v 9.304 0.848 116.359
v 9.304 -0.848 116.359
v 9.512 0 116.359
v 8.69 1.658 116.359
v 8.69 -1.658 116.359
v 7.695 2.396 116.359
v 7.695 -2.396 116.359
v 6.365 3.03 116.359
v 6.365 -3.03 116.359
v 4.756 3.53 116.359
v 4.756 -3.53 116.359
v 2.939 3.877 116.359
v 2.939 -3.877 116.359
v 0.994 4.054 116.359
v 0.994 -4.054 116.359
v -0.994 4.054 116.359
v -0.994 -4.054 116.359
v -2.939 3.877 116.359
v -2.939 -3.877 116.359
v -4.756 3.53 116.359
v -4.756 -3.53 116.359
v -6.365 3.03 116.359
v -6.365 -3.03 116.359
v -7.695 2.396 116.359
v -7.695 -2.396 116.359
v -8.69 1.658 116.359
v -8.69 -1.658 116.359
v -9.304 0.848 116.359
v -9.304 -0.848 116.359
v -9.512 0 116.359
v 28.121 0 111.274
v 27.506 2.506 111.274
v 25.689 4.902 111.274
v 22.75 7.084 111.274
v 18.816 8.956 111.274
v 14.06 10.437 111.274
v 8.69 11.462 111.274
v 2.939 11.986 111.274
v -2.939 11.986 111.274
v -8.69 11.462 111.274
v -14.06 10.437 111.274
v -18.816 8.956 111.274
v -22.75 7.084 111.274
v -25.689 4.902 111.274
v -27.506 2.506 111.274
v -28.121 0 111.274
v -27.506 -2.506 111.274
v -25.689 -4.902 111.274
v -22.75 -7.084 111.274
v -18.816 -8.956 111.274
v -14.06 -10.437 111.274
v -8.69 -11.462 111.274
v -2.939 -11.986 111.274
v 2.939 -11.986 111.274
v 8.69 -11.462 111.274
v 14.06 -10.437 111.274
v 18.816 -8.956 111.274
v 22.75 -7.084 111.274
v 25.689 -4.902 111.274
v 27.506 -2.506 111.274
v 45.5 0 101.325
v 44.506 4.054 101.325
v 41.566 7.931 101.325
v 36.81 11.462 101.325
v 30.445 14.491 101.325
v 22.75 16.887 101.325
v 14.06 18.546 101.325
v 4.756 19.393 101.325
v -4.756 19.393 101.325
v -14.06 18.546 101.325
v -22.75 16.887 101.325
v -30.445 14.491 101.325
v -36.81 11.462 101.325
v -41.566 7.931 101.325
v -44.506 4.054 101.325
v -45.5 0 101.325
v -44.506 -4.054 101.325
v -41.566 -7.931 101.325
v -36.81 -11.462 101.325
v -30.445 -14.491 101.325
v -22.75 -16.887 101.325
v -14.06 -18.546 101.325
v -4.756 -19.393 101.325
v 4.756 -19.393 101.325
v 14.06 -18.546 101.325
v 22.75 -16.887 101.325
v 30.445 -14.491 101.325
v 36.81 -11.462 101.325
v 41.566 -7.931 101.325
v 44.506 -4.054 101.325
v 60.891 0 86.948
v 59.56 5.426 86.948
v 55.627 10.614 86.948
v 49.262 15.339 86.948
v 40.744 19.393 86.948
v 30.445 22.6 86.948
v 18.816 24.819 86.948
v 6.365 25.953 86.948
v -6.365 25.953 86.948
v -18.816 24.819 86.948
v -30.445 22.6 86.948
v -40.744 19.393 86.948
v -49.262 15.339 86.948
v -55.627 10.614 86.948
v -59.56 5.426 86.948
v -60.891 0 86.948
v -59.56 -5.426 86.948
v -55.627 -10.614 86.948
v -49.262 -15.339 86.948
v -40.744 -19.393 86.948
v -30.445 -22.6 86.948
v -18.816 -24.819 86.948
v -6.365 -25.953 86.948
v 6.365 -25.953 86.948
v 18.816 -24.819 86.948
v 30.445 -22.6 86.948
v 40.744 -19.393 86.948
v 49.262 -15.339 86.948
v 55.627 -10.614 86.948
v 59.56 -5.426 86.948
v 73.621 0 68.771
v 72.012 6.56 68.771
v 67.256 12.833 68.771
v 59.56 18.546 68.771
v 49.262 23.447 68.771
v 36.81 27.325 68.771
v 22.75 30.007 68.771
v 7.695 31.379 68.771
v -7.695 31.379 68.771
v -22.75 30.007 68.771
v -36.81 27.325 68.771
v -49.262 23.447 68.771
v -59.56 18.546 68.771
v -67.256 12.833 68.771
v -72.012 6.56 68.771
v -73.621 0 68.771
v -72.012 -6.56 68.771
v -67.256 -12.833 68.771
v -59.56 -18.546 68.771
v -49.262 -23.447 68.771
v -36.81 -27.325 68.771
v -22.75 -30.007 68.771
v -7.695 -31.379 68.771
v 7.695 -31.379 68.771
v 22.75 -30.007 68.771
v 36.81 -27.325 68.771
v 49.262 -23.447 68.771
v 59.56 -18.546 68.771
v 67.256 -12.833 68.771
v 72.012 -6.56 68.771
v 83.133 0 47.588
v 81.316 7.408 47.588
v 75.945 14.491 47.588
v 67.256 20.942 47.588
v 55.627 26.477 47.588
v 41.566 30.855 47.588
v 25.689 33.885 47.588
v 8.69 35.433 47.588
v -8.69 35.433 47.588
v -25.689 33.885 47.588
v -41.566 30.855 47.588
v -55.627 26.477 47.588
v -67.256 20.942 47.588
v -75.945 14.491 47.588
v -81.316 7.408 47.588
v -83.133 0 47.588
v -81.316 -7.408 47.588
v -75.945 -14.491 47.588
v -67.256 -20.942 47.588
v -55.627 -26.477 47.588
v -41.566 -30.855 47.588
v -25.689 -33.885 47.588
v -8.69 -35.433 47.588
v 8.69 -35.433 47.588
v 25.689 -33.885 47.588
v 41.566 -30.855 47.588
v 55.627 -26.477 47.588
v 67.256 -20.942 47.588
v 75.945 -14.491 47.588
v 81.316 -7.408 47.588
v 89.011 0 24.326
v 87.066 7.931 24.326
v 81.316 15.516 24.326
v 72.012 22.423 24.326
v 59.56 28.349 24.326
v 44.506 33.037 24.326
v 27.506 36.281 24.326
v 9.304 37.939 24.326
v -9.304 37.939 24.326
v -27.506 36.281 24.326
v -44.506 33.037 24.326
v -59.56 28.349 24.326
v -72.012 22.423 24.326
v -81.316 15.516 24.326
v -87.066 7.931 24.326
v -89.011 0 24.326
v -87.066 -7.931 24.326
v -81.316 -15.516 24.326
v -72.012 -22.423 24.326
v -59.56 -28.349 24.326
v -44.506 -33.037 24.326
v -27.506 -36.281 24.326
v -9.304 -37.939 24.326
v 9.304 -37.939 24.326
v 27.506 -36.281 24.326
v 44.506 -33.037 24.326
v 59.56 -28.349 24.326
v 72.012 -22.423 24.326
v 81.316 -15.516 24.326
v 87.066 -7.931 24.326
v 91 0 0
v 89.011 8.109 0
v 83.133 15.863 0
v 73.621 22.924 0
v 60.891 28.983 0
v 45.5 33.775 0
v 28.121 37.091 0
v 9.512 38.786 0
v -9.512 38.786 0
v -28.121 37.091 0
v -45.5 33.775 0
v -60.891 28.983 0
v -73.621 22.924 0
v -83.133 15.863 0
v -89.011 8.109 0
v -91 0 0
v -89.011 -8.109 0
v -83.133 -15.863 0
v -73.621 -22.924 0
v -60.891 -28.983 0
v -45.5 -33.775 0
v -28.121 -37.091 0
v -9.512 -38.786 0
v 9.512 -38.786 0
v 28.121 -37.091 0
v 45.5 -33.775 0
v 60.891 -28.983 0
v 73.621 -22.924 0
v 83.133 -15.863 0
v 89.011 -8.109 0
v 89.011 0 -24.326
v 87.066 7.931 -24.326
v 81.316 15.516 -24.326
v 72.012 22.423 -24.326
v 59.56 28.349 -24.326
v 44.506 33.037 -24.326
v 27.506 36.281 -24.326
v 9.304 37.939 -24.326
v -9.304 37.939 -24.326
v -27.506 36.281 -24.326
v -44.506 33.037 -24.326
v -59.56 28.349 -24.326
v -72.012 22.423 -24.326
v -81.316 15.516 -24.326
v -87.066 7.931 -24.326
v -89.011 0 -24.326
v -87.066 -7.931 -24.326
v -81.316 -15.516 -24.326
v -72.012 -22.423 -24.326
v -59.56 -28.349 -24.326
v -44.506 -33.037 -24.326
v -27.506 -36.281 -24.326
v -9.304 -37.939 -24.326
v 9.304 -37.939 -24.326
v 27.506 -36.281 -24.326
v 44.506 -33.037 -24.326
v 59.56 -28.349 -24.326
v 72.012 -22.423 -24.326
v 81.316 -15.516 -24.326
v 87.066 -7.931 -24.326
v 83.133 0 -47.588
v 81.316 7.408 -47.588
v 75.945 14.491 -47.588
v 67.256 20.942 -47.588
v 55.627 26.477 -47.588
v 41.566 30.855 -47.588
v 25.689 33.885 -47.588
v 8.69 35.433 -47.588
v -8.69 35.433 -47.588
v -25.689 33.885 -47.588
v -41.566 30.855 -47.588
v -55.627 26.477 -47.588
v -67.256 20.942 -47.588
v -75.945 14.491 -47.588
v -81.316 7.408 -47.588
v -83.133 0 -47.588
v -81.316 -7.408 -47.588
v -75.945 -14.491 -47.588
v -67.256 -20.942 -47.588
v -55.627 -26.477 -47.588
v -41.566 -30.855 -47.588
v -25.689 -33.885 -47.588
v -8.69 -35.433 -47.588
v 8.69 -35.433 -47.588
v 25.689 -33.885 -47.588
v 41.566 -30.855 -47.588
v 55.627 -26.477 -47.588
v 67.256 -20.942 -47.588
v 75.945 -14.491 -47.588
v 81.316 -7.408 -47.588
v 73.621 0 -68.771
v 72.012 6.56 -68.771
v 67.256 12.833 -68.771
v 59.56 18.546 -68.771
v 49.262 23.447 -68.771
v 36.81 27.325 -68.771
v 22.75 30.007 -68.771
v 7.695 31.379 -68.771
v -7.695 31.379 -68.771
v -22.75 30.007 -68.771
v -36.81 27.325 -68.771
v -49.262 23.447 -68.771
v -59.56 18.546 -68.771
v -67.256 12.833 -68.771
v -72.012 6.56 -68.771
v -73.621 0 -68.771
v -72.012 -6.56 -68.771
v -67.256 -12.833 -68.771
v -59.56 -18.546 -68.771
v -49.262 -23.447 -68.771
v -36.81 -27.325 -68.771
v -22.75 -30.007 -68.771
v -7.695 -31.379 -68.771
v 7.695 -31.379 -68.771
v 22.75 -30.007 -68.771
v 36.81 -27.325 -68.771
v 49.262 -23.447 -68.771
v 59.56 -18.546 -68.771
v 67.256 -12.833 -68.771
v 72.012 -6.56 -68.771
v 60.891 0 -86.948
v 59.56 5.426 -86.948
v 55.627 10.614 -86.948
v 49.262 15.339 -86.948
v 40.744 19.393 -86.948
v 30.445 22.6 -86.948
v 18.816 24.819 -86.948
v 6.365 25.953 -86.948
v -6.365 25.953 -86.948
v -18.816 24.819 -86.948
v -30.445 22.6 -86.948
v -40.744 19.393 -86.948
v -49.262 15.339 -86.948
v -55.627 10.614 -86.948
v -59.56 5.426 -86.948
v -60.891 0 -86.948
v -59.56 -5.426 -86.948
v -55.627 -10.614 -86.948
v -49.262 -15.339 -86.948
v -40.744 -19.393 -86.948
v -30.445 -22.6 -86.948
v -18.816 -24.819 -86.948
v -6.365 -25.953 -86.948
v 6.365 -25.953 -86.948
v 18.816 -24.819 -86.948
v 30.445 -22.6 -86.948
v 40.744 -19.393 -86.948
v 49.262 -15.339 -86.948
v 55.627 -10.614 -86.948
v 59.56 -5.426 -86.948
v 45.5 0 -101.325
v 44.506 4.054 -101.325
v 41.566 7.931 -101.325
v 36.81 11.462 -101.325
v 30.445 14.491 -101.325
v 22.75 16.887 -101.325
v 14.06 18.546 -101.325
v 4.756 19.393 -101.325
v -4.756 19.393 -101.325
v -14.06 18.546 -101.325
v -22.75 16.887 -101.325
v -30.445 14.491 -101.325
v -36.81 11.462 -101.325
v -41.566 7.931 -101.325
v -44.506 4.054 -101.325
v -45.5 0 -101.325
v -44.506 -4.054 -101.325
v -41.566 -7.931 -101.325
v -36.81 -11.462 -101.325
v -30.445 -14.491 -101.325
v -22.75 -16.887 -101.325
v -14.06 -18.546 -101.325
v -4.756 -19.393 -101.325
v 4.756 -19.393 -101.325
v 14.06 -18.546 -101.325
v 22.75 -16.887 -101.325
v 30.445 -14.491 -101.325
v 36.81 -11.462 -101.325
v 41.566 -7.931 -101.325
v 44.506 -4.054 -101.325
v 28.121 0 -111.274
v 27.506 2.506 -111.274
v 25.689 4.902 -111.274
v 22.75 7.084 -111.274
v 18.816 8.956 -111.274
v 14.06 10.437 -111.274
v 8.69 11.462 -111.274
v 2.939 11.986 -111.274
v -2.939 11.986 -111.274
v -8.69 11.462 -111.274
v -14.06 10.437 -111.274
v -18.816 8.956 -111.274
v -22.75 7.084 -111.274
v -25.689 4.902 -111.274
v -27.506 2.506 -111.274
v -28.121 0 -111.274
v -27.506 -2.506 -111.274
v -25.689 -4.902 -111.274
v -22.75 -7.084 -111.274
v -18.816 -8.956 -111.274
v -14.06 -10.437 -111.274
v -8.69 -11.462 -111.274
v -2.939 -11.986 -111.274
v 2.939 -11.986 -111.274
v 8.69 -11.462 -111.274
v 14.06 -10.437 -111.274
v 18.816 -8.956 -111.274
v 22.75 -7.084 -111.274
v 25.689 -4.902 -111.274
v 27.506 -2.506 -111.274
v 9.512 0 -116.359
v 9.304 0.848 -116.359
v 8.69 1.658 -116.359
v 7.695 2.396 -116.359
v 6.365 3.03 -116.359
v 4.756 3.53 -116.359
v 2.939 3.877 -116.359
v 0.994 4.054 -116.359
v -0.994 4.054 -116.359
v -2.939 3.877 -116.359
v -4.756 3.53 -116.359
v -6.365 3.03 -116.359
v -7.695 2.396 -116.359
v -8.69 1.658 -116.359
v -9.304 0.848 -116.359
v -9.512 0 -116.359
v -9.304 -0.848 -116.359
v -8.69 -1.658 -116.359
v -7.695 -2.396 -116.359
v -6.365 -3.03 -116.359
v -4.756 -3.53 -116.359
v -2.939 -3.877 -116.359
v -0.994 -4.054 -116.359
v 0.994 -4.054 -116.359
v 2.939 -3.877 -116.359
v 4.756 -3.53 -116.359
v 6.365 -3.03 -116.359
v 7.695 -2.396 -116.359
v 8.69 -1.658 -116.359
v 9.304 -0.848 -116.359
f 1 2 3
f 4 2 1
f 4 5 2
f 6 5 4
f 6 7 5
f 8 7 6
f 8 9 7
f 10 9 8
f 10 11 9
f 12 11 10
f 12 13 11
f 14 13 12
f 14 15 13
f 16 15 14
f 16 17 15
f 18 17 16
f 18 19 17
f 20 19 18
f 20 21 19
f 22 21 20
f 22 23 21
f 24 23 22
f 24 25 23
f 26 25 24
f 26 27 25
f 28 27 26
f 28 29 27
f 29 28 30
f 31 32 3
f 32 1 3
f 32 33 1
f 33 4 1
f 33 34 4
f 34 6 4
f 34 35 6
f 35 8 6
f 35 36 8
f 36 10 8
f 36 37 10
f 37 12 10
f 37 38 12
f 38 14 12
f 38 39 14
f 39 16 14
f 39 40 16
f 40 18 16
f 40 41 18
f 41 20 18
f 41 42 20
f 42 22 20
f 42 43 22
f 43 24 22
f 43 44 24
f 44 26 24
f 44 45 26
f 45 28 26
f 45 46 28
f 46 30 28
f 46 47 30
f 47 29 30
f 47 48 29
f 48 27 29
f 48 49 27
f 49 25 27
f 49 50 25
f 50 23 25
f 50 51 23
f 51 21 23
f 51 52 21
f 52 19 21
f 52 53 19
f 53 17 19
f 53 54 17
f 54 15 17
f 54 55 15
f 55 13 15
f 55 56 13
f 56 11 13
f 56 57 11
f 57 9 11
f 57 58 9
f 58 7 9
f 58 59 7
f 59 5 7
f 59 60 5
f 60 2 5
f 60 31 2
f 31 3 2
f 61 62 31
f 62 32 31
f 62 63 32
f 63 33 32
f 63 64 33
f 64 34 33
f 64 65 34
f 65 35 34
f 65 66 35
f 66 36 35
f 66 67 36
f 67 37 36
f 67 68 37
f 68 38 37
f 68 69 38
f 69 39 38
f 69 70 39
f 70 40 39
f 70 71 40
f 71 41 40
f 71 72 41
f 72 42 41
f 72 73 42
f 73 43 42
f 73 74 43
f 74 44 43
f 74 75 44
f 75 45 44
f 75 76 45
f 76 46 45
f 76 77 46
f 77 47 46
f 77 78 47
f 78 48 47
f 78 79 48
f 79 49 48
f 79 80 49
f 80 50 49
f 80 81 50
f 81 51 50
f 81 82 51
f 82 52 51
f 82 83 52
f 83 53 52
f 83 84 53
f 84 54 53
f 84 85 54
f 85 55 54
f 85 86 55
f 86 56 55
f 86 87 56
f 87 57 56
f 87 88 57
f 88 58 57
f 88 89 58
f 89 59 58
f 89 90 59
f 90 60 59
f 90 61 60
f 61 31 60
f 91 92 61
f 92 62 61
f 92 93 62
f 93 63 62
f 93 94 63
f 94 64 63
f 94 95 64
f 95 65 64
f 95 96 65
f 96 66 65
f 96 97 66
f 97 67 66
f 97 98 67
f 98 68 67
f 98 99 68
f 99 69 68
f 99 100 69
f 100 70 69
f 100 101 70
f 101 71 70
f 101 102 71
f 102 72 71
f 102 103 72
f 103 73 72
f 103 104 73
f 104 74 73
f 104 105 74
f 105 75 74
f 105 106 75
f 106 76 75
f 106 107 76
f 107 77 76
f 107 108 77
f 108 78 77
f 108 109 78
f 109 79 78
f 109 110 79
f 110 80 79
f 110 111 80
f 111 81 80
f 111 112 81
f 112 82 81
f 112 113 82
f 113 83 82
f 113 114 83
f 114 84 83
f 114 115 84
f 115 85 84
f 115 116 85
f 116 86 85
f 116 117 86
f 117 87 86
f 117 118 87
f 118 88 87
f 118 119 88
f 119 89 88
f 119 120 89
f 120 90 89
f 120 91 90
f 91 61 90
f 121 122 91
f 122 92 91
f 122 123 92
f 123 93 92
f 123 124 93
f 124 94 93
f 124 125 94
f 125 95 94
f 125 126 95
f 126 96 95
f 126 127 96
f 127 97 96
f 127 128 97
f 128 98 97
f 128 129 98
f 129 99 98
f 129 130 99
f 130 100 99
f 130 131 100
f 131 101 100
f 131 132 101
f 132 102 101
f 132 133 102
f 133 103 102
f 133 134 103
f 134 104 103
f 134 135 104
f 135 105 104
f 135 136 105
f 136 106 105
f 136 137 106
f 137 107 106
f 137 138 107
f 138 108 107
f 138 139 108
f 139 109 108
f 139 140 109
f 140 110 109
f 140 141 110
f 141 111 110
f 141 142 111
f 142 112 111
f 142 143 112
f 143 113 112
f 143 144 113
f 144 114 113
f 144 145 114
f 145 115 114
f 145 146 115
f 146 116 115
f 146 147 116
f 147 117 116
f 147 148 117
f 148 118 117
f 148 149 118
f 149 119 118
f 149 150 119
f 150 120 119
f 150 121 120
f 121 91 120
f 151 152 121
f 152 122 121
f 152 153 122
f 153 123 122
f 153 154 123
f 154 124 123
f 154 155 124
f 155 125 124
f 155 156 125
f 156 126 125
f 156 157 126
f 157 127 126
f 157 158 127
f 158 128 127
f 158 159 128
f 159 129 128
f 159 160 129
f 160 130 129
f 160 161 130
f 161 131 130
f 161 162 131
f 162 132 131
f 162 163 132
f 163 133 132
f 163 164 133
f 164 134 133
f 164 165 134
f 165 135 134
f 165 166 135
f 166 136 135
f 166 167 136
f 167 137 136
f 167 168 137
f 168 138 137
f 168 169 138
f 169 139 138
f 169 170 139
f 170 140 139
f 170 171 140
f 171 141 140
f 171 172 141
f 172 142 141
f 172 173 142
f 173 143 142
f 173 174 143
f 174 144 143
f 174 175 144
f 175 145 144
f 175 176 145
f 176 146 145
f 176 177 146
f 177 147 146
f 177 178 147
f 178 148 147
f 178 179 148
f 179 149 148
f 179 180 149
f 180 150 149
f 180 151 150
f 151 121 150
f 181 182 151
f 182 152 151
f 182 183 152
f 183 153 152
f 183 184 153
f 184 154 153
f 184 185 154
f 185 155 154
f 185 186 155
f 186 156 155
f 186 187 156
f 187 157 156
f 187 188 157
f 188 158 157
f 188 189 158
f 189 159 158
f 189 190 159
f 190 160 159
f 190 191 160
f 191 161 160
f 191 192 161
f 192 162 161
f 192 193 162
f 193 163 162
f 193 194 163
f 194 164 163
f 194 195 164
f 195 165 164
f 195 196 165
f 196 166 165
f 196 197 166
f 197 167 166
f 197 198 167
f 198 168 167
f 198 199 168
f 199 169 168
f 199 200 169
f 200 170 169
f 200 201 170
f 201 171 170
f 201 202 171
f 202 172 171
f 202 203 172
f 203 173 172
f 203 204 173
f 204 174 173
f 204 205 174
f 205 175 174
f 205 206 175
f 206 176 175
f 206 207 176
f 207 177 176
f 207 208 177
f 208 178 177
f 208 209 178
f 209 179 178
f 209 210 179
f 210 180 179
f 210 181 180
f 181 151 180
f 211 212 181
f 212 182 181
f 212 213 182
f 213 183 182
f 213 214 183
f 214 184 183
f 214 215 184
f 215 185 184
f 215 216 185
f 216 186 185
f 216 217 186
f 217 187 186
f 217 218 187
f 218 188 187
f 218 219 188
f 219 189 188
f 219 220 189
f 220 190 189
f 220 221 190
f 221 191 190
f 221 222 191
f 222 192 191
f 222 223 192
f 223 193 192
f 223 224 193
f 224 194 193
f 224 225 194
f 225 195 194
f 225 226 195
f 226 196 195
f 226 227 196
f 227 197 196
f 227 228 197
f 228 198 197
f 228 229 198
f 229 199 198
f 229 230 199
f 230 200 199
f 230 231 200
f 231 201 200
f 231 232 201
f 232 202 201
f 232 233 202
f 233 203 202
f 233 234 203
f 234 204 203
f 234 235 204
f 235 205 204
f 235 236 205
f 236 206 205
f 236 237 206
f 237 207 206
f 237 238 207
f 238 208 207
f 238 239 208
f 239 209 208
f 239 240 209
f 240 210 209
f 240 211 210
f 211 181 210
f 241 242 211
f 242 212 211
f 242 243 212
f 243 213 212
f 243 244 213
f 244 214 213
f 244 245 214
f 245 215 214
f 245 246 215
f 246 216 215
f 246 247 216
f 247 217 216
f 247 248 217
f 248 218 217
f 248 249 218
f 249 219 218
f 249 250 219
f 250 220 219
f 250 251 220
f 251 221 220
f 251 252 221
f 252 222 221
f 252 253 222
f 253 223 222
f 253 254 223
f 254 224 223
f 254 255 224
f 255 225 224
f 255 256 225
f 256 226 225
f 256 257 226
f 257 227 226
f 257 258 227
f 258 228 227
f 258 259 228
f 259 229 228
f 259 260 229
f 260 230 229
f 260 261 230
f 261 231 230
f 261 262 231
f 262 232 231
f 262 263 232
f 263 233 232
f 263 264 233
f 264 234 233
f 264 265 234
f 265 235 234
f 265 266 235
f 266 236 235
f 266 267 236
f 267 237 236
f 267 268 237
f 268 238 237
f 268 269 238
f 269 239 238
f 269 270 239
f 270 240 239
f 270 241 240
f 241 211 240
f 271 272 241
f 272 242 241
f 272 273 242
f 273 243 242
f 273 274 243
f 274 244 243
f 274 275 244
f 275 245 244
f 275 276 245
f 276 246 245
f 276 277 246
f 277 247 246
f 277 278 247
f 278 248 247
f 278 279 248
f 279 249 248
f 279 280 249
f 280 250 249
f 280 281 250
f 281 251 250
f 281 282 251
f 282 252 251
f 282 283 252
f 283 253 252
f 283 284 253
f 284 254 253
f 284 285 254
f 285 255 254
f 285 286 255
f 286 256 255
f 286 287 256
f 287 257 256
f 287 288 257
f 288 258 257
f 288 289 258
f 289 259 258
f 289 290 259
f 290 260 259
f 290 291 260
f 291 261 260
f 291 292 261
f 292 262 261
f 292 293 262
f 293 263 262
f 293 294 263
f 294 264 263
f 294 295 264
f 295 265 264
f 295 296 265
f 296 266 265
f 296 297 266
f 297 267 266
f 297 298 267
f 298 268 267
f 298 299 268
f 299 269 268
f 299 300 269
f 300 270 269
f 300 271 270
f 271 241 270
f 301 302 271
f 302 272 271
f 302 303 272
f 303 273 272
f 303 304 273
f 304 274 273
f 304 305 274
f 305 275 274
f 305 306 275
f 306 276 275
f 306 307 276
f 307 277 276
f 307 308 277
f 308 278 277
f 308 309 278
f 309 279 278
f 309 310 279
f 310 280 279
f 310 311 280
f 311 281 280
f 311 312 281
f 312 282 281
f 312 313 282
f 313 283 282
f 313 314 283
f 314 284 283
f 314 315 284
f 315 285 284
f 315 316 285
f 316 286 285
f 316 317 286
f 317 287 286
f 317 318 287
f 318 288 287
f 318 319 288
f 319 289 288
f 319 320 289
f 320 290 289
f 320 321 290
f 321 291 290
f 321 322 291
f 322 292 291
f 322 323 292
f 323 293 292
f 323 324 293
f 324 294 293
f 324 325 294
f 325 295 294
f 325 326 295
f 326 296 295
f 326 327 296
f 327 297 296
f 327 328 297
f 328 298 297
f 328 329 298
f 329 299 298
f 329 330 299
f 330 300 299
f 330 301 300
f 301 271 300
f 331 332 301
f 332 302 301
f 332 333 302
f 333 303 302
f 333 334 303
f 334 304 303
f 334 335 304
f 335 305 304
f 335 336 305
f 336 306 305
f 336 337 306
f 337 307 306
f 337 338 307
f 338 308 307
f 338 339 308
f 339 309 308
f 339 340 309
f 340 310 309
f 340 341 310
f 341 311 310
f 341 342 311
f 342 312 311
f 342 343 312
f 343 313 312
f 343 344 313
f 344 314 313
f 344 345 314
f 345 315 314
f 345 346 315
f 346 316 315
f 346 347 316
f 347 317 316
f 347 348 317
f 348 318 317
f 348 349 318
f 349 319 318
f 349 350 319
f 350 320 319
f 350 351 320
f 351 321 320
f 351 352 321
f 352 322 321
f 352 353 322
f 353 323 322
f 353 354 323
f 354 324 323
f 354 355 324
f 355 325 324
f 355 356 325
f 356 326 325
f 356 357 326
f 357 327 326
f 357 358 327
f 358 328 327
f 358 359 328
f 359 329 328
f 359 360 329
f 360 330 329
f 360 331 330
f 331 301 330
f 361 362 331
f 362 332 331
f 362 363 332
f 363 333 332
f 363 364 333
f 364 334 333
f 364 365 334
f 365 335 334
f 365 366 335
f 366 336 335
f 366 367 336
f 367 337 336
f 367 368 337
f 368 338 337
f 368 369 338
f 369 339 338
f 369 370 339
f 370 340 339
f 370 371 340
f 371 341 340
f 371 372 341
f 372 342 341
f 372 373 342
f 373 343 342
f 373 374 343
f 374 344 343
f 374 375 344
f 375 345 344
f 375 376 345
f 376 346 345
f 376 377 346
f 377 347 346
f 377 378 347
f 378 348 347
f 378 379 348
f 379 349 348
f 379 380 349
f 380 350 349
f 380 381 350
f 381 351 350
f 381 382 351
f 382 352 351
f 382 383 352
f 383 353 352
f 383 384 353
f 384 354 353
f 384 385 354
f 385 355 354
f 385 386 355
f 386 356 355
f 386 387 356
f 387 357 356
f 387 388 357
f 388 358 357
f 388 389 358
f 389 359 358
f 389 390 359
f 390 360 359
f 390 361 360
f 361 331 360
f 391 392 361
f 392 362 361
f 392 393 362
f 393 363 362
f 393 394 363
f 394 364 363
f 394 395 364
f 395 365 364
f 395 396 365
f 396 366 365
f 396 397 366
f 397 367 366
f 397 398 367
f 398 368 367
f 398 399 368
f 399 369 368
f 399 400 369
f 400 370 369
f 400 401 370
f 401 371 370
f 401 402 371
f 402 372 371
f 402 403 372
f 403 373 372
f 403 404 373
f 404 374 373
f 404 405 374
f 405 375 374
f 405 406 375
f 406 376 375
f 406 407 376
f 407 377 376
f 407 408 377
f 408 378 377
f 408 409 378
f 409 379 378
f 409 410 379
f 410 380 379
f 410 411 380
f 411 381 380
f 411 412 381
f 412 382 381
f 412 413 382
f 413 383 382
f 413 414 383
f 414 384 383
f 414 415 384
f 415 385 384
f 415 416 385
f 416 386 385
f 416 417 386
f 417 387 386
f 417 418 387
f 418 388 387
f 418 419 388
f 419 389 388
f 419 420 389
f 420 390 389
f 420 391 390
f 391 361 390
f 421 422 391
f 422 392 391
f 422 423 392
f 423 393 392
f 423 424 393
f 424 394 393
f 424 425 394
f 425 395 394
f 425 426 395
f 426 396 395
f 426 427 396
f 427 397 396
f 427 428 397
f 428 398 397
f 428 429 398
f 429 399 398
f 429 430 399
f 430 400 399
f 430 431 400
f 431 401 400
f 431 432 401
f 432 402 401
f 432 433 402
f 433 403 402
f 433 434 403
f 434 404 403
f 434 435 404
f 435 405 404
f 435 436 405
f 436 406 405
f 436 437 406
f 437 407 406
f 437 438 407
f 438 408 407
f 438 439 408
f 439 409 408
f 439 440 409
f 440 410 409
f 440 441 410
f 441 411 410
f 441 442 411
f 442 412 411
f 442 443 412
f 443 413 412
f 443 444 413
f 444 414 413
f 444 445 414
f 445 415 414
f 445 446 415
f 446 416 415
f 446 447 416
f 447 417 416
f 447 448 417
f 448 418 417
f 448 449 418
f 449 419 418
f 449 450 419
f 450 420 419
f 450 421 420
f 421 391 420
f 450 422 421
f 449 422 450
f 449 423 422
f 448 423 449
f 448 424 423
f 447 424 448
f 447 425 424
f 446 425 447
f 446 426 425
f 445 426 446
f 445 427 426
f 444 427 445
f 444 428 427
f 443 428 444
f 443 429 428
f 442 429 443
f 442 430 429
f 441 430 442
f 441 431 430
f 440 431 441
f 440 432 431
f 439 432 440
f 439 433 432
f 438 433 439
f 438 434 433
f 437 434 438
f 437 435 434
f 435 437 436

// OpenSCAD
// Generated by SolidPython 1.0.1 on 2020-07-29 00:46:47


scale(v = [7, 3, 9]) {
	sphere(r = 13);
}
/***********************************************
*********      SolidPython code:      **********
************************************************
 
# import packages: SolidPython
from solid import *
from solid.utils import *
from itertools import chain, combinations, permutations


class Resize:

    def __init__(self, scad_file):
        self.scad_file = scad_file
        #self.scad_file = import_scad(scad_file)
        # cone/cylinder param:
        self.r1 = 0
        self.r2 = 0
        self.h = 0
        # rectangular prism param:
        self.w = 0
        self.l = 0
        # ellipse param:
        self.r = 0

    # import OpenScad code (file name corresponds to shape)


    # classify shape + parameters
    def assign(self, param1, param2, param3):
        if self.scad_file == 'cone.scad':
            self.r1 = param1
            self.r2 = param2
            self.h = param3
        elif self.scad_file == 'cylinder.scad':
            self.r1 = param1
            self.r2 = param2
            self.h = param3
        elif self.scad_file == 'rectangularPrism.scad':
            self.h = param1
            self.l = param2
            self.w = param3
        else:
            self.r = param1
            self.h = param2

    # resize parameters
    def iterate(self):
        x = range(3, 20, 2)
        i = 1
        if self.scad_file == 'cone.scad':
            tempList = list(permutations(x, 2))
            for temp in tempList:
                param1 = temp[0]
                param2 = temp[1]
                filepath = 'produced_scad_files/' + 'cone' + str(param1) + '_' + str(param2) + '_' + '.scad'
                scad_render_to_file(cylinder(h=param1, r1=param2, r2=0), filepath)

        elif self.scad_file == 'cylinder.scad':
            tempList = list(permutations(x, 3))
            for temp in tempList:
                param1 = temp[0]
                param2 = temp[1]
                filepath = 'produced_scad_files/' + 'cylinder' + str(param1) + '_' + str(param2) + '_' + '.scad'
                scad_render_to_file(cylinder(h=param1, r1=param2, r2=param2), filepath)

        elif self.scad_file == 'rectangularPrism.scad':
            tempList = list(permutations(x, 3))
            for temp in tempList:
                param1 = temp[0]
                param2 = temp[1]
                param3 = temp[2]
                filepath = 'produced_scad_files/' + 'rectangularPrism' + str(param1) + '_' + str(param2) + '_' + str(
                    param3) + '.scad'
                scad_render_to_file(cube(size=(param1, param2, param3)), filepath)

        elif self.scad_file == 'ellipse.scad':
            tempList = list(permutations(x, 4))
            for temp in tempList:
                param1 = temp[0]
                param2 = temp[1]
                param3 = temp[2]
                param4 = temp[3]
                filepath = 'produced_scad_files/' + 'ellipse' + str(param1) + '_' + str(param2) + '_' + str(param3) + '_' + str(param4) + '.scad'
                scad_render_to_file(scale([param1, param2, param3])(sphere(r=param4)), filepath)

    def render_to_scadfile(self):
        scad_render_to_file(scad, 'example.scad') 
 
************************************************/
